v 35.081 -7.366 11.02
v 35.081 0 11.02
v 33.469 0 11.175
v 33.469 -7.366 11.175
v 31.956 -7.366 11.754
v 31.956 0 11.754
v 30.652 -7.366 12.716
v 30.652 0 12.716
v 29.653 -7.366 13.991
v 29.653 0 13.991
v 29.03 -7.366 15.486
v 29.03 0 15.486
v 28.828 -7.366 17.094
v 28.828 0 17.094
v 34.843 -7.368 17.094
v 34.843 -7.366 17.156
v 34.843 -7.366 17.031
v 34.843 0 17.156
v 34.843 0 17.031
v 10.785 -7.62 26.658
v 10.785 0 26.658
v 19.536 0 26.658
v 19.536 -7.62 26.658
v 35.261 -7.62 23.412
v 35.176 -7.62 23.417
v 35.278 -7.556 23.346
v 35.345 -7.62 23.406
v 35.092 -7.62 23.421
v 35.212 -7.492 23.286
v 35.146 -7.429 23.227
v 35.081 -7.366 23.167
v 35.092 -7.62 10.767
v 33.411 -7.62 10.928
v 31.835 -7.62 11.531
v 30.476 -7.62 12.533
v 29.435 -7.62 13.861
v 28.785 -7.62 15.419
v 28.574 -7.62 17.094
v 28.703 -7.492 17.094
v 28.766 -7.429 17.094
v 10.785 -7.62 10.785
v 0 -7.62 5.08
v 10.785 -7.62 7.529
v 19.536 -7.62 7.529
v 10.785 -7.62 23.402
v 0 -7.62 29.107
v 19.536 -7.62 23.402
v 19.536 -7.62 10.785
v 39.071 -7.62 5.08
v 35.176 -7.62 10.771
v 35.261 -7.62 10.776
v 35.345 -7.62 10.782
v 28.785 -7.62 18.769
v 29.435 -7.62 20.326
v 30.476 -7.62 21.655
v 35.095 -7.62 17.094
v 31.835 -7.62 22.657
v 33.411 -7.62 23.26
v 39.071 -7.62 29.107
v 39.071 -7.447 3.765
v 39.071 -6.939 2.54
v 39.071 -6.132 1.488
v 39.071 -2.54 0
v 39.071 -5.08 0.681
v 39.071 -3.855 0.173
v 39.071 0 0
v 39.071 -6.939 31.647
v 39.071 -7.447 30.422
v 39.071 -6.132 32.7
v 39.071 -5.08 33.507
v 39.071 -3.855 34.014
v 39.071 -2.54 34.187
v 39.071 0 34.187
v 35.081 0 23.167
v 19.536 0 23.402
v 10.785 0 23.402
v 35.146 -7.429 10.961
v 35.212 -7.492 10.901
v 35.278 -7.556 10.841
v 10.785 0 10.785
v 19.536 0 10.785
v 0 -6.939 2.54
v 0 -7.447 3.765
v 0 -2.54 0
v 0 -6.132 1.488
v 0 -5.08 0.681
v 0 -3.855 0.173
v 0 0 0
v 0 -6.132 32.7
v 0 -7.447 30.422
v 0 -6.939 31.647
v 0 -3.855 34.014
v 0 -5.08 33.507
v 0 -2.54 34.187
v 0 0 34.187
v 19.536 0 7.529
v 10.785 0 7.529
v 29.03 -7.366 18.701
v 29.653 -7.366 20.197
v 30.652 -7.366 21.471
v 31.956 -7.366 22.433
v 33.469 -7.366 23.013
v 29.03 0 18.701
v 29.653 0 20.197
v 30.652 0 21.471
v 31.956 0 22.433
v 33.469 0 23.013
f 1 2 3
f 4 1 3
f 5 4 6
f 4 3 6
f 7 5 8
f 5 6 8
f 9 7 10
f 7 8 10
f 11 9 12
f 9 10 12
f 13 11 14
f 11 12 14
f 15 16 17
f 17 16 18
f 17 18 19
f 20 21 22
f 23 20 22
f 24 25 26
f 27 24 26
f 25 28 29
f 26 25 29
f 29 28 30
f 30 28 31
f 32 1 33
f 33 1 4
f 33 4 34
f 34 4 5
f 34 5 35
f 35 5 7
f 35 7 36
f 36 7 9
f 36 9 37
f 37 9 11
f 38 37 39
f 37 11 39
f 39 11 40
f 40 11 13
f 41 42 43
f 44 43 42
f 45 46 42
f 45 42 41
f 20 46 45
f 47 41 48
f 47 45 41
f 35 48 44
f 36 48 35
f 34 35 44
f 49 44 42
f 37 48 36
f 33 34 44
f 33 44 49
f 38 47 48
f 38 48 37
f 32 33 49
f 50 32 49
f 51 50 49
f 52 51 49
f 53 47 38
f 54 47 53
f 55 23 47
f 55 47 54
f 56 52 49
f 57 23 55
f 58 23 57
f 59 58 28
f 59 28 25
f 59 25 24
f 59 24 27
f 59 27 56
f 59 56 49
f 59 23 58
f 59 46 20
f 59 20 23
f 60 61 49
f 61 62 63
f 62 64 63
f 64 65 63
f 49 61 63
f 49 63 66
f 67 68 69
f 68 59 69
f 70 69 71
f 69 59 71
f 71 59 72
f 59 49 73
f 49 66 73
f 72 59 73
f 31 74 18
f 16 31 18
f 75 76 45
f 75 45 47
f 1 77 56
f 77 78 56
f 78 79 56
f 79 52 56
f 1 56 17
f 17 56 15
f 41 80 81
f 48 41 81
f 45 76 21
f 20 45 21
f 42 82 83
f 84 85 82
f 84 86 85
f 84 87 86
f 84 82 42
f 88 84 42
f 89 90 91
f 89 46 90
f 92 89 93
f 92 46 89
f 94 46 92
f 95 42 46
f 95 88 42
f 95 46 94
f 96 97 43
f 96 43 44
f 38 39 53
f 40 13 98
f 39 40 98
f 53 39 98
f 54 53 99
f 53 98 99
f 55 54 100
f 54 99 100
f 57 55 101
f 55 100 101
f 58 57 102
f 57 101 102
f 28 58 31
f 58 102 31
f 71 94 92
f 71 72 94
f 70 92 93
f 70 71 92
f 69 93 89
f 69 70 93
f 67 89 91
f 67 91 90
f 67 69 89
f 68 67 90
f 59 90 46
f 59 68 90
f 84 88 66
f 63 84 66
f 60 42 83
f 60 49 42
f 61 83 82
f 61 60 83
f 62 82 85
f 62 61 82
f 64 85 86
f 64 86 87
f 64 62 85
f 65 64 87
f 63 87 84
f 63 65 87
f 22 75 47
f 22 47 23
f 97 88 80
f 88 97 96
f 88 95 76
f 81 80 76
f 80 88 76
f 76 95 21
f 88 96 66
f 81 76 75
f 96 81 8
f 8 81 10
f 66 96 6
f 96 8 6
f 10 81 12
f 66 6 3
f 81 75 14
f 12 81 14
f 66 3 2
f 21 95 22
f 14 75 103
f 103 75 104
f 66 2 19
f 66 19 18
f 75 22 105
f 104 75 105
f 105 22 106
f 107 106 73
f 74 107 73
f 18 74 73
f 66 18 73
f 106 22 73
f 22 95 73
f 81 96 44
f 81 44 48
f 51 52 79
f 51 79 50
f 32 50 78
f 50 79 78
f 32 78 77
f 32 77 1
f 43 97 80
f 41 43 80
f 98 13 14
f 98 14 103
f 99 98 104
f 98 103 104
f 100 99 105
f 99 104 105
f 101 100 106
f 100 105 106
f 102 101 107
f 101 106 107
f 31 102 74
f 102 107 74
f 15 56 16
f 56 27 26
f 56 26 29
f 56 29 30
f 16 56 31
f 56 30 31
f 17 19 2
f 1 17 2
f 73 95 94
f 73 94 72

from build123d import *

# Parameters (mm, degrees)
F0_W         = 39.0713959932
F0_H         = 34.1874808073
F0_W_2       = 8.7503567338
F0_H_2       = 3.2559484243
F1_DEPTH     = 7.62
F2_R         = 5.08
F3_R         = 5.08
F4_T2_ANGLE  = 99.0884829953
F4_T4_ANGLE  = 99.0884829953
F4_T8_DEPTH  = 7.3218336241
F4_S9_R      = 6.0154186662
F4_T10_DEPTH = 5
F4_T14_DEPTH = 7.3218336241
F4_S15_R     = 6.0154186662
F4_T16_DEPTH = 5
F4_T21_DEPTH = 7.3218336241
F4_S22_R     = 6.0154186662
F4_T23_DEPTH = 5
F4_T26_ANGLE = 105.3128275547
F4_T33_ANGLE = 105.3128275547
F4_T37_DEPTH = 7.3218336241
F4_S38_R     = 6.0154186662
F4_T39_DEPTH = 5


# Not quite as in the source:
# - a fillet or chamfer that OpenCascade refuses, or shapes differently, is made with other operations: its cross-section is extruded or revolved along the edge and cut away or added


with BuildPart() as f1:
    # F0 (on Front) → F1 (new body)
    with BuildSketch(Plane.XZ):
        with Locations((19.5356979966, 17.0937404037)):
            Rectangle(F0_W, F0_H)
        with Locations((15.1605196297, 9.1573596001)):
            Rectangle(F0_W_2, F0_H_2, mode=Mode.SUBTRACT)
        with Locations((15.1605196297, 25.0301212072)):
            Rectangle(F0_W_2, F0_H_2, mode=Mode.SUBTRACT)
        with BuildLine():
            ThreePointArc((28.8283239088, 17.0937404037), (30.6523842077, 21.4714728973), (35.0814722478, 23.1670308858))
            Line((35.0814722478, 23.1670308858), (34.8434170056, 17.1563244854))
            Line((34.8434170056, 17.1563244854), (34.8434170056, 17.0311563219))
            Line((34.8434170056, 17.0311563219), (35.0814722478, 11.0204499215))
            ThreePointArc((35.0814722478, 11.0204499215), (30.6523842077, 12.71600791), (28.8283239088, 17.0937404037))
        make_face(mode=Mode.SUBTRACT)
    extrude(amount=F1_DEPTH)

    # F2
    f2_edges = [f1.edges().sort_by_distance(p)[0] for p in [
        (19.535698, -7.62, 34.187481),
    ]]
    fillet(f2_edges, radius=F2_R)

    # F3
    f3_edges = [f1.edges().sort_by_distance(p)[0] for p in [
        (19.535698, -7.62, 0),
    ]]
    fillet(f3_edges, radius=F3_R)

    # F4: chamfer of 0.254 on 4 edges, made by hand

    # F4_s1 → F4_t2 (revolve, cut)
    with BuildSketch(Plane(origin=(35.4623142005, 0, 1.4044921235), x_dir=(0, 1, 0), z_dir=(0.9992166354, 0, 0.0395741769))):
        Polygon((-7.62, 9.3694965041), (-7.366, 9.6234965041), (-7.62, 9.6234965041), align=None)
    revolve(axis=Axis((34.8434170056, -7.62, 17.0311563219), (0, 1, 0)), revolution_arc=F4_T2_ANGLE, mode=Mode.SUBTRACT)

    # F4_s3 → F4_t4 (revolve, cut)
    with BuildSketch(Plane(origin=(-1.5316236266, 0, 12.8056905764), x_dir=(0, 1, 0), z_dir=(0.1187584985, 0, -0.9929231688))):
        Polygon((-7.62, 30.3648766921), (-7.366, 30.6188766921), (-7.62, 30.6188766921), align=None)
    revolve(axis=Axis((34.8434170056, -7.62, 17.1563244854), (0, 1, 0)), revolution_arc=F4_T4_ANGLE, mode=Mode.SUBTRACT)


with BuildPart() as f4_tool6:
    # F4_s7 → F4_t8 (new body)
    with BuildSketch(Plane(origin=(0.9968897612, 0, 25.170677246), x_dir=(0, 1, 0), z_dir=(-0.0395741769, 0, -0.9992166354))):
        Polygon((-7.62, 34.3911744878), (-7.366, 34.1371744878), (-7.62, 34.1371744878), align=None)
    extrude(amount=F4_T8_DEPTH)

    # F4_s9 → F4_t10 (intersect, symmetric)
    with BuildSketch(Plane.XZ.offset(7.5)):
        with Locations((34.8434170056, 17.1563244854)):
            Circle(F4_S9_R)
    extrude(amount=F4_T10_DEPTH, both=True, mode=Mode.INTERSECT)


with BuildPart() as f1_1:
    add(f1.part)

    # F4_t5: cut F4_tool6
    add(f4_tool6.part, mode=Mode.SUBTRACT)


with BuildPart() as f4_tool12:
    # F4_s13 → F4_t14 (new body)
    with BuildSketch(Plane(origin=(-0.6447473432, 0, 16.2793599777), x_dir=(0, 1, 0), z_dir=(0.0395741769, 0, -0.9992166354))):
        Polygon((-7.62, 35.7441158998), (-7.366, 35.4901158998), (-7.62, 35.4901158998), align=None)
    extrude(amount=F4_T14_DEPTH)

    # F4_s15 → F4_t16 (intersect, symmetric)
    with BuildSketch(Plane.XZ.offset(7.5)):
        with Locations((34.8434170056, 17.0311563219)):
            Circle(F4_S15_R)
    extrude(amount=F4_T16_DEPTH, both=True, mode=Mode.INTERSECT)


with BuildPart() as f1_2:
    add(f1_1.part)

    # F4_t11: cut F4_tool12
    add(f4_tool12.part, mode=Mode.SUBTRACT)


with BuildPart() as f4_tool19:
    # F4_s20 → F4_t21 (new body)
    with BuildSketch(Plane(origin=(-0.6447473432, 0, 16.2793599777), x_dir=(0, 1, 0), z_dir=(0.0395741769, 0, -0.9992166354))):
        Polygon((-7.62, 35.7441158998), (-7.366, 35.4901158998), (-7.62, 35.4901158998), align=None)
    extrude(amount=F4_T21_DEPTH)

    # F4_s22 → F4_t23 (cut, symmetric)
    with BuildSketch(Plane.XZ.offset(7.5)):
        with Locations((34.8434170056, 17.0311563219)):
            Circle(F4_S22_R)
    extrude(amount=F4_T23_DEPTH, both=True, mode=Mode.SUBTRACT)


with BuildPart() as f4_tool24:
    # F4_s25 → F4_t26 (revolve)
    with BuildSketch(Plane(origin=(36.5710723448, 0, 5.4606046716), x_dir=(0, 1, 0), z_dir=(0.9890355378, 0, 0.1476777062))):
        Polygon((-7.62, 5.4294042858), (-7.366, 5.6834042858), (-7.62, 5.6834042858), align=None)
    revolve(axis=Axis((34.8434170056, -7.62, 17.0311563219), (0, 1, 0)), revolution_arc=F4_T26_ANGLE)

    split(bisect_by=Plane(origin=(35.4623142005, 0, 1.4044921235), x_dir=(0, 1, 0), z_dir=(0.9992166354, 0, 0.0395741769)), keep=Keep.TOP)


with BuildPart() as f4_tool19_1:
    add(f4_tool19.part)

    # F4_t28: intersect F4_tool24
    add(f4_tool24.part, mode=Mode.INTERSECT)


with BuildPart() as f1_3:
    add(f1_2.part)

    # F4_t17: cut F4_tool19
    add(f4_tool19_1.part, mode=Mode.SUBTRACT)


with BuildPart() as f4_tool31:
    # F4_s32 → F4_t33 (revolve)
    with BuildSketch(Plane(origin=(-1.5316236266, 0, 12.8056905764), x_dir=(0, 1, 0), z_dir=(0.1187584985, 0, -0.9929231688))):
        Polygon((-7.62, 30.3648766921), (-7.366, 30.6188766921), (-7.62, 30.6188766921), align=None)
    revolve(axis=Axis((34.8434170056, -7.62, 17.1563244854), (0, 1, 0)), revolution_arc=F4_T33_ANGLE)

    split(bisect_by=Plane(origin=(34.1104326349, 0, -1.3509505808), x_dir=(0, 1, 0), z_dir=(0.9992166354, 0, -0.0395741769)), keep=Keep.TOP)


with BuildPart() as f4_tool35:
    # F4_s36 → F4_t37 (new body)
    with BuildSketch(Plane(origin=(0.9968897612, 0, 25.170677246), x_dir=(0, 1, 0), z_dir=(-0.0395741769, 0, -0.9992166354))):
        Polygon((-7.62, 34.3911744878), (-7.366, 34.1371744878), (-7.62, 34.1371744878), align=None)
    extrude(amount=F4_T37_DEPTH)

    # F4_s38 → F4_t39 (cut, symmetric)
    with BuildSketch(Plane.XZ.offset(7.5)):
        with Locations((34.8434170056, 17.1563244854)):
            Circle(F4_S38_R)
    extrude(amount=F4_T39_DEPTH, both=True, mode=Mode.SUBTRACT)


with BuildPart() as f4_tool31_1:
    add(f4_tool31.part)

    # F4_t40: intersect F4_tool35
    add(f4_tool35.part, mode=Mode.INTERSECT)


with BuildPart() as f1_4:
    add(f1_3.part)

    # F4_t29: cut F4_tool31
    add(f4_tool31_1.part, mode=Mode.SUBTRACT)


solid = f1_4.part
